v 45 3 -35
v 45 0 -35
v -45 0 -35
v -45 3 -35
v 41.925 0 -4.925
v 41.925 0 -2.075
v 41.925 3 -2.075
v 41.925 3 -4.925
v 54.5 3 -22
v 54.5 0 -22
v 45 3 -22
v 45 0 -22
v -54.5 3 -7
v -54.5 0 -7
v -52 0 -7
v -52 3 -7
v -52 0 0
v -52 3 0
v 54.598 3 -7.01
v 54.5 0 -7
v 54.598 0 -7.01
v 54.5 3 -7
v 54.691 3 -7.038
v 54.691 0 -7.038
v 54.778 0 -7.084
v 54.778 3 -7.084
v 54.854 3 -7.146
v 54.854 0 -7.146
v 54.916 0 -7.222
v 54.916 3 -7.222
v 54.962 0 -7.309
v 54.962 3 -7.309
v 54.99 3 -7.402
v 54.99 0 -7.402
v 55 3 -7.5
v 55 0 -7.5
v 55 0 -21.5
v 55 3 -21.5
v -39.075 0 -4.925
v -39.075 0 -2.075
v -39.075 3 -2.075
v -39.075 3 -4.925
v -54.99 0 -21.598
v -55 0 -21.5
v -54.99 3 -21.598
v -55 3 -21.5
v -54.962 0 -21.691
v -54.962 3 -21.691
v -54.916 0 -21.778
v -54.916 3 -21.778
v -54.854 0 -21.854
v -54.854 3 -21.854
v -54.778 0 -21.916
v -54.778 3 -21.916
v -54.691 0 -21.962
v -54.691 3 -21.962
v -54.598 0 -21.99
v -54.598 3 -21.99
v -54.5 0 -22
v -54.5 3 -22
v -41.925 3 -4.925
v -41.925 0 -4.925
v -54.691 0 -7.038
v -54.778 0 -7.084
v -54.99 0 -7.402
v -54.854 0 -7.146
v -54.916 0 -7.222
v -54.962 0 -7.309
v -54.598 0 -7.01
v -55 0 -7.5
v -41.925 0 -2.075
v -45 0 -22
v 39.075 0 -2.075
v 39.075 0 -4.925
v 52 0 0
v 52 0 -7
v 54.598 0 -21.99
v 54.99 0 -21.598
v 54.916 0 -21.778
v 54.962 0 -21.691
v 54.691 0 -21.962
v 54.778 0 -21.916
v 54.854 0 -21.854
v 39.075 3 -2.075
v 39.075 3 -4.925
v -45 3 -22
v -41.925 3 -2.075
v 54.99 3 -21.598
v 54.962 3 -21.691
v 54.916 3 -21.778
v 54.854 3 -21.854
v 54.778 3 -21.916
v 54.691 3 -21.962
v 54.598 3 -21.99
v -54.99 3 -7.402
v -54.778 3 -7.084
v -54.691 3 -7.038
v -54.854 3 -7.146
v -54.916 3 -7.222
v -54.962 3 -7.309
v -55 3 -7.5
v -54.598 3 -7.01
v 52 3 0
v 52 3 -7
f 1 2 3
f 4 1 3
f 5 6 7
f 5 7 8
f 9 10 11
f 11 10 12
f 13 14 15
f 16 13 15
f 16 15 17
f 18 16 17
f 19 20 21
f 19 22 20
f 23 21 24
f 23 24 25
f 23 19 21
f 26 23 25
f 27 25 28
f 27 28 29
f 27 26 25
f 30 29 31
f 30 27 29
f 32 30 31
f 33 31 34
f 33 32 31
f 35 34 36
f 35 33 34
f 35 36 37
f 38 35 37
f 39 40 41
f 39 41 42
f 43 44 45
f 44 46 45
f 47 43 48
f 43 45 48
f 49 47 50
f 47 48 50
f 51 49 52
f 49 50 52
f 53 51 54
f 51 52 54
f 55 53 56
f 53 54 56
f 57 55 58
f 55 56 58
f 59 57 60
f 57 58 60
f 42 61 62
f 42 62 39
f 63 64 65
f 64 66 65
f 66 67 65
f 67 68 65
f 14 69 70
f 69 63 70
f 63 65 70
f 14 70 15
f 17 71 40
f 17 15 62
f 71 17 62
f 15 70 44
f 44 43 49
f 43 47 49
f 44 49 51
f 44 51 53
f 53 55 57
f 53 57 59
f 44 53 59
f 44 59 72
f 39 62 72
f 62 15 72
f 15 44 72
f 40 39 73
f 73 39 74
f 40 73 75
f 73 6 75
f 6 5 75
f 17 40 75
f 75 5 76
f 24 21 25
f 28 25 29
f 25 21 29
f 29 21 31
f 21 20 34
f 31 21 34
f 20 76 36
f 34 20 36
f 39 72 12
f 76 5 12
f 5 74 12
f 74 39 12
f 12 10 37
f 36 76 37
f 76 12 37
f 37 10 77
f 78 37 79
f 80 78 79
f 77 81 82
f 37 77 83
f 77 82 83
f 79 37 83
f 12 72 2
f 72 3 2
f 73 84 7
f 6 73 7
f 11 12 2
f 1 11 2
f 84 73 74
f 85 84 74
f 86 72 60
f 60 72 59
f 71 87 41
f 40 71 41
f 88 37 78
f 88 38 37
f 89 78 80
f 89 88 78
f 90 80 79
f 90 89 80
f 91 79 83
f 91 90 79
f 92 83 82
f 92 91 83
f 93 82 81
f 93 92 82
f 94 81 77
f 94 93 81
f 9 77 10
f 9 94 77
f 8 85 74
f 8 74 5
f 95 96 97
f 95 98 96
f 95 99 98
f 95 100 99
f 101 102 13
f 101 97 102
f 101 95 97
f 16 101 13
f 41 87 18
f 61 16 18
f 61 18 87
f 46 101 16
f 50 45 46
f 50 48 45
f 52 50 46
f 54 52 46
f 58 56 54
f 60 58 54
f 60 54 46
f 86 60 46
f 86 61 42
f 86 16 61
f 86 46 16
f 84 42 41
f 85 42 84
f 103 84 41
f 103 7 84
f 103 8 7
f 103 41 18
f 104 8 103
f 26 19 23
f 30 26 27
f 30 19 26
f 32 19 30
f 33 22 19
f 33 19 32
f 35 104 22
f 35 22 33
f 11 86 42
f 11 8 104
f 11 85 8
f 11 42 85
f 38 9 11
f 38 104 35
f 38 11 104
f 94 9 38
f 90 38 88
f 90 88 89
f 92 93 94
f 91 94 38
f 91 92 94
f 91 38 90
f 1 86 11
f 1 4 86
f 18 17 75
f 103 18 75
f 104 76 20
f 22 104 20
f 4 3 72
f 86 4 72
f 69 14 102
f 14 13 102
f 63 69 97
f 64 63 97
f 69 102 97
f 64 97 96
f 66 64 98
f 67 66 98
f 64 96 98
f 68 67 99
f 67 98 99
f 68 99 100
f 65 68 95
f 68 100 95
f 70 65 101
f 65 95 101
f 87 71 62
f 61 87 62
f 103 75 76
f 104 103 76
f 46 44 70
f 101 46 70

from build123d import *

# Parameters (mm, degrees)
SKETCH_1_W      = 2.85
SKETCH_1_H      = 2.85
EXTRUDE_1_DEPTH = 3
FILLET_1_R      = 0.5


with BuildPart() as part:
    # Эскиз1 → Бобышка-Вытянуть1 (new body)
    with BuildSketch(Plane(origin=(0, 0, 0), x_dir=(1, 0, 0), z_dir=(0, 1, 0))):
        Polygon((-52, 0), (52, 0), (52, 7), (55, 7), (55, 22), (45, 22), (45, 35), (-45, 35), (-45, 22), (-55, 22), (-55, 7), (-52, 7), align=None)
        with Locations((40.5, 3.5)):
            Rectangle(SKETCH_1_W, SKETCH_1_H, mode=Mode.SUBTRACT)
        with Locations((-40.5, 3.5)):
            Rectangle(SKETCH_1_W, SKETCH_1_H, mode=Mode.SUBTRACT)
    extrude(amount=EXTRUDE_1_DEPTH)

    # Скругление1
    fillet_1_edges = [part.edges().sort_by_distance(p)[0] for p in [
        (-55, 1.5, -7),
        (-55, 1.5, -22),
        (55, 1.5, -22),
        (55, 1.5, -7),
    ]]
    fillet(fillet_1_edges, radius=FILLET_1_R)


solid = part.part
